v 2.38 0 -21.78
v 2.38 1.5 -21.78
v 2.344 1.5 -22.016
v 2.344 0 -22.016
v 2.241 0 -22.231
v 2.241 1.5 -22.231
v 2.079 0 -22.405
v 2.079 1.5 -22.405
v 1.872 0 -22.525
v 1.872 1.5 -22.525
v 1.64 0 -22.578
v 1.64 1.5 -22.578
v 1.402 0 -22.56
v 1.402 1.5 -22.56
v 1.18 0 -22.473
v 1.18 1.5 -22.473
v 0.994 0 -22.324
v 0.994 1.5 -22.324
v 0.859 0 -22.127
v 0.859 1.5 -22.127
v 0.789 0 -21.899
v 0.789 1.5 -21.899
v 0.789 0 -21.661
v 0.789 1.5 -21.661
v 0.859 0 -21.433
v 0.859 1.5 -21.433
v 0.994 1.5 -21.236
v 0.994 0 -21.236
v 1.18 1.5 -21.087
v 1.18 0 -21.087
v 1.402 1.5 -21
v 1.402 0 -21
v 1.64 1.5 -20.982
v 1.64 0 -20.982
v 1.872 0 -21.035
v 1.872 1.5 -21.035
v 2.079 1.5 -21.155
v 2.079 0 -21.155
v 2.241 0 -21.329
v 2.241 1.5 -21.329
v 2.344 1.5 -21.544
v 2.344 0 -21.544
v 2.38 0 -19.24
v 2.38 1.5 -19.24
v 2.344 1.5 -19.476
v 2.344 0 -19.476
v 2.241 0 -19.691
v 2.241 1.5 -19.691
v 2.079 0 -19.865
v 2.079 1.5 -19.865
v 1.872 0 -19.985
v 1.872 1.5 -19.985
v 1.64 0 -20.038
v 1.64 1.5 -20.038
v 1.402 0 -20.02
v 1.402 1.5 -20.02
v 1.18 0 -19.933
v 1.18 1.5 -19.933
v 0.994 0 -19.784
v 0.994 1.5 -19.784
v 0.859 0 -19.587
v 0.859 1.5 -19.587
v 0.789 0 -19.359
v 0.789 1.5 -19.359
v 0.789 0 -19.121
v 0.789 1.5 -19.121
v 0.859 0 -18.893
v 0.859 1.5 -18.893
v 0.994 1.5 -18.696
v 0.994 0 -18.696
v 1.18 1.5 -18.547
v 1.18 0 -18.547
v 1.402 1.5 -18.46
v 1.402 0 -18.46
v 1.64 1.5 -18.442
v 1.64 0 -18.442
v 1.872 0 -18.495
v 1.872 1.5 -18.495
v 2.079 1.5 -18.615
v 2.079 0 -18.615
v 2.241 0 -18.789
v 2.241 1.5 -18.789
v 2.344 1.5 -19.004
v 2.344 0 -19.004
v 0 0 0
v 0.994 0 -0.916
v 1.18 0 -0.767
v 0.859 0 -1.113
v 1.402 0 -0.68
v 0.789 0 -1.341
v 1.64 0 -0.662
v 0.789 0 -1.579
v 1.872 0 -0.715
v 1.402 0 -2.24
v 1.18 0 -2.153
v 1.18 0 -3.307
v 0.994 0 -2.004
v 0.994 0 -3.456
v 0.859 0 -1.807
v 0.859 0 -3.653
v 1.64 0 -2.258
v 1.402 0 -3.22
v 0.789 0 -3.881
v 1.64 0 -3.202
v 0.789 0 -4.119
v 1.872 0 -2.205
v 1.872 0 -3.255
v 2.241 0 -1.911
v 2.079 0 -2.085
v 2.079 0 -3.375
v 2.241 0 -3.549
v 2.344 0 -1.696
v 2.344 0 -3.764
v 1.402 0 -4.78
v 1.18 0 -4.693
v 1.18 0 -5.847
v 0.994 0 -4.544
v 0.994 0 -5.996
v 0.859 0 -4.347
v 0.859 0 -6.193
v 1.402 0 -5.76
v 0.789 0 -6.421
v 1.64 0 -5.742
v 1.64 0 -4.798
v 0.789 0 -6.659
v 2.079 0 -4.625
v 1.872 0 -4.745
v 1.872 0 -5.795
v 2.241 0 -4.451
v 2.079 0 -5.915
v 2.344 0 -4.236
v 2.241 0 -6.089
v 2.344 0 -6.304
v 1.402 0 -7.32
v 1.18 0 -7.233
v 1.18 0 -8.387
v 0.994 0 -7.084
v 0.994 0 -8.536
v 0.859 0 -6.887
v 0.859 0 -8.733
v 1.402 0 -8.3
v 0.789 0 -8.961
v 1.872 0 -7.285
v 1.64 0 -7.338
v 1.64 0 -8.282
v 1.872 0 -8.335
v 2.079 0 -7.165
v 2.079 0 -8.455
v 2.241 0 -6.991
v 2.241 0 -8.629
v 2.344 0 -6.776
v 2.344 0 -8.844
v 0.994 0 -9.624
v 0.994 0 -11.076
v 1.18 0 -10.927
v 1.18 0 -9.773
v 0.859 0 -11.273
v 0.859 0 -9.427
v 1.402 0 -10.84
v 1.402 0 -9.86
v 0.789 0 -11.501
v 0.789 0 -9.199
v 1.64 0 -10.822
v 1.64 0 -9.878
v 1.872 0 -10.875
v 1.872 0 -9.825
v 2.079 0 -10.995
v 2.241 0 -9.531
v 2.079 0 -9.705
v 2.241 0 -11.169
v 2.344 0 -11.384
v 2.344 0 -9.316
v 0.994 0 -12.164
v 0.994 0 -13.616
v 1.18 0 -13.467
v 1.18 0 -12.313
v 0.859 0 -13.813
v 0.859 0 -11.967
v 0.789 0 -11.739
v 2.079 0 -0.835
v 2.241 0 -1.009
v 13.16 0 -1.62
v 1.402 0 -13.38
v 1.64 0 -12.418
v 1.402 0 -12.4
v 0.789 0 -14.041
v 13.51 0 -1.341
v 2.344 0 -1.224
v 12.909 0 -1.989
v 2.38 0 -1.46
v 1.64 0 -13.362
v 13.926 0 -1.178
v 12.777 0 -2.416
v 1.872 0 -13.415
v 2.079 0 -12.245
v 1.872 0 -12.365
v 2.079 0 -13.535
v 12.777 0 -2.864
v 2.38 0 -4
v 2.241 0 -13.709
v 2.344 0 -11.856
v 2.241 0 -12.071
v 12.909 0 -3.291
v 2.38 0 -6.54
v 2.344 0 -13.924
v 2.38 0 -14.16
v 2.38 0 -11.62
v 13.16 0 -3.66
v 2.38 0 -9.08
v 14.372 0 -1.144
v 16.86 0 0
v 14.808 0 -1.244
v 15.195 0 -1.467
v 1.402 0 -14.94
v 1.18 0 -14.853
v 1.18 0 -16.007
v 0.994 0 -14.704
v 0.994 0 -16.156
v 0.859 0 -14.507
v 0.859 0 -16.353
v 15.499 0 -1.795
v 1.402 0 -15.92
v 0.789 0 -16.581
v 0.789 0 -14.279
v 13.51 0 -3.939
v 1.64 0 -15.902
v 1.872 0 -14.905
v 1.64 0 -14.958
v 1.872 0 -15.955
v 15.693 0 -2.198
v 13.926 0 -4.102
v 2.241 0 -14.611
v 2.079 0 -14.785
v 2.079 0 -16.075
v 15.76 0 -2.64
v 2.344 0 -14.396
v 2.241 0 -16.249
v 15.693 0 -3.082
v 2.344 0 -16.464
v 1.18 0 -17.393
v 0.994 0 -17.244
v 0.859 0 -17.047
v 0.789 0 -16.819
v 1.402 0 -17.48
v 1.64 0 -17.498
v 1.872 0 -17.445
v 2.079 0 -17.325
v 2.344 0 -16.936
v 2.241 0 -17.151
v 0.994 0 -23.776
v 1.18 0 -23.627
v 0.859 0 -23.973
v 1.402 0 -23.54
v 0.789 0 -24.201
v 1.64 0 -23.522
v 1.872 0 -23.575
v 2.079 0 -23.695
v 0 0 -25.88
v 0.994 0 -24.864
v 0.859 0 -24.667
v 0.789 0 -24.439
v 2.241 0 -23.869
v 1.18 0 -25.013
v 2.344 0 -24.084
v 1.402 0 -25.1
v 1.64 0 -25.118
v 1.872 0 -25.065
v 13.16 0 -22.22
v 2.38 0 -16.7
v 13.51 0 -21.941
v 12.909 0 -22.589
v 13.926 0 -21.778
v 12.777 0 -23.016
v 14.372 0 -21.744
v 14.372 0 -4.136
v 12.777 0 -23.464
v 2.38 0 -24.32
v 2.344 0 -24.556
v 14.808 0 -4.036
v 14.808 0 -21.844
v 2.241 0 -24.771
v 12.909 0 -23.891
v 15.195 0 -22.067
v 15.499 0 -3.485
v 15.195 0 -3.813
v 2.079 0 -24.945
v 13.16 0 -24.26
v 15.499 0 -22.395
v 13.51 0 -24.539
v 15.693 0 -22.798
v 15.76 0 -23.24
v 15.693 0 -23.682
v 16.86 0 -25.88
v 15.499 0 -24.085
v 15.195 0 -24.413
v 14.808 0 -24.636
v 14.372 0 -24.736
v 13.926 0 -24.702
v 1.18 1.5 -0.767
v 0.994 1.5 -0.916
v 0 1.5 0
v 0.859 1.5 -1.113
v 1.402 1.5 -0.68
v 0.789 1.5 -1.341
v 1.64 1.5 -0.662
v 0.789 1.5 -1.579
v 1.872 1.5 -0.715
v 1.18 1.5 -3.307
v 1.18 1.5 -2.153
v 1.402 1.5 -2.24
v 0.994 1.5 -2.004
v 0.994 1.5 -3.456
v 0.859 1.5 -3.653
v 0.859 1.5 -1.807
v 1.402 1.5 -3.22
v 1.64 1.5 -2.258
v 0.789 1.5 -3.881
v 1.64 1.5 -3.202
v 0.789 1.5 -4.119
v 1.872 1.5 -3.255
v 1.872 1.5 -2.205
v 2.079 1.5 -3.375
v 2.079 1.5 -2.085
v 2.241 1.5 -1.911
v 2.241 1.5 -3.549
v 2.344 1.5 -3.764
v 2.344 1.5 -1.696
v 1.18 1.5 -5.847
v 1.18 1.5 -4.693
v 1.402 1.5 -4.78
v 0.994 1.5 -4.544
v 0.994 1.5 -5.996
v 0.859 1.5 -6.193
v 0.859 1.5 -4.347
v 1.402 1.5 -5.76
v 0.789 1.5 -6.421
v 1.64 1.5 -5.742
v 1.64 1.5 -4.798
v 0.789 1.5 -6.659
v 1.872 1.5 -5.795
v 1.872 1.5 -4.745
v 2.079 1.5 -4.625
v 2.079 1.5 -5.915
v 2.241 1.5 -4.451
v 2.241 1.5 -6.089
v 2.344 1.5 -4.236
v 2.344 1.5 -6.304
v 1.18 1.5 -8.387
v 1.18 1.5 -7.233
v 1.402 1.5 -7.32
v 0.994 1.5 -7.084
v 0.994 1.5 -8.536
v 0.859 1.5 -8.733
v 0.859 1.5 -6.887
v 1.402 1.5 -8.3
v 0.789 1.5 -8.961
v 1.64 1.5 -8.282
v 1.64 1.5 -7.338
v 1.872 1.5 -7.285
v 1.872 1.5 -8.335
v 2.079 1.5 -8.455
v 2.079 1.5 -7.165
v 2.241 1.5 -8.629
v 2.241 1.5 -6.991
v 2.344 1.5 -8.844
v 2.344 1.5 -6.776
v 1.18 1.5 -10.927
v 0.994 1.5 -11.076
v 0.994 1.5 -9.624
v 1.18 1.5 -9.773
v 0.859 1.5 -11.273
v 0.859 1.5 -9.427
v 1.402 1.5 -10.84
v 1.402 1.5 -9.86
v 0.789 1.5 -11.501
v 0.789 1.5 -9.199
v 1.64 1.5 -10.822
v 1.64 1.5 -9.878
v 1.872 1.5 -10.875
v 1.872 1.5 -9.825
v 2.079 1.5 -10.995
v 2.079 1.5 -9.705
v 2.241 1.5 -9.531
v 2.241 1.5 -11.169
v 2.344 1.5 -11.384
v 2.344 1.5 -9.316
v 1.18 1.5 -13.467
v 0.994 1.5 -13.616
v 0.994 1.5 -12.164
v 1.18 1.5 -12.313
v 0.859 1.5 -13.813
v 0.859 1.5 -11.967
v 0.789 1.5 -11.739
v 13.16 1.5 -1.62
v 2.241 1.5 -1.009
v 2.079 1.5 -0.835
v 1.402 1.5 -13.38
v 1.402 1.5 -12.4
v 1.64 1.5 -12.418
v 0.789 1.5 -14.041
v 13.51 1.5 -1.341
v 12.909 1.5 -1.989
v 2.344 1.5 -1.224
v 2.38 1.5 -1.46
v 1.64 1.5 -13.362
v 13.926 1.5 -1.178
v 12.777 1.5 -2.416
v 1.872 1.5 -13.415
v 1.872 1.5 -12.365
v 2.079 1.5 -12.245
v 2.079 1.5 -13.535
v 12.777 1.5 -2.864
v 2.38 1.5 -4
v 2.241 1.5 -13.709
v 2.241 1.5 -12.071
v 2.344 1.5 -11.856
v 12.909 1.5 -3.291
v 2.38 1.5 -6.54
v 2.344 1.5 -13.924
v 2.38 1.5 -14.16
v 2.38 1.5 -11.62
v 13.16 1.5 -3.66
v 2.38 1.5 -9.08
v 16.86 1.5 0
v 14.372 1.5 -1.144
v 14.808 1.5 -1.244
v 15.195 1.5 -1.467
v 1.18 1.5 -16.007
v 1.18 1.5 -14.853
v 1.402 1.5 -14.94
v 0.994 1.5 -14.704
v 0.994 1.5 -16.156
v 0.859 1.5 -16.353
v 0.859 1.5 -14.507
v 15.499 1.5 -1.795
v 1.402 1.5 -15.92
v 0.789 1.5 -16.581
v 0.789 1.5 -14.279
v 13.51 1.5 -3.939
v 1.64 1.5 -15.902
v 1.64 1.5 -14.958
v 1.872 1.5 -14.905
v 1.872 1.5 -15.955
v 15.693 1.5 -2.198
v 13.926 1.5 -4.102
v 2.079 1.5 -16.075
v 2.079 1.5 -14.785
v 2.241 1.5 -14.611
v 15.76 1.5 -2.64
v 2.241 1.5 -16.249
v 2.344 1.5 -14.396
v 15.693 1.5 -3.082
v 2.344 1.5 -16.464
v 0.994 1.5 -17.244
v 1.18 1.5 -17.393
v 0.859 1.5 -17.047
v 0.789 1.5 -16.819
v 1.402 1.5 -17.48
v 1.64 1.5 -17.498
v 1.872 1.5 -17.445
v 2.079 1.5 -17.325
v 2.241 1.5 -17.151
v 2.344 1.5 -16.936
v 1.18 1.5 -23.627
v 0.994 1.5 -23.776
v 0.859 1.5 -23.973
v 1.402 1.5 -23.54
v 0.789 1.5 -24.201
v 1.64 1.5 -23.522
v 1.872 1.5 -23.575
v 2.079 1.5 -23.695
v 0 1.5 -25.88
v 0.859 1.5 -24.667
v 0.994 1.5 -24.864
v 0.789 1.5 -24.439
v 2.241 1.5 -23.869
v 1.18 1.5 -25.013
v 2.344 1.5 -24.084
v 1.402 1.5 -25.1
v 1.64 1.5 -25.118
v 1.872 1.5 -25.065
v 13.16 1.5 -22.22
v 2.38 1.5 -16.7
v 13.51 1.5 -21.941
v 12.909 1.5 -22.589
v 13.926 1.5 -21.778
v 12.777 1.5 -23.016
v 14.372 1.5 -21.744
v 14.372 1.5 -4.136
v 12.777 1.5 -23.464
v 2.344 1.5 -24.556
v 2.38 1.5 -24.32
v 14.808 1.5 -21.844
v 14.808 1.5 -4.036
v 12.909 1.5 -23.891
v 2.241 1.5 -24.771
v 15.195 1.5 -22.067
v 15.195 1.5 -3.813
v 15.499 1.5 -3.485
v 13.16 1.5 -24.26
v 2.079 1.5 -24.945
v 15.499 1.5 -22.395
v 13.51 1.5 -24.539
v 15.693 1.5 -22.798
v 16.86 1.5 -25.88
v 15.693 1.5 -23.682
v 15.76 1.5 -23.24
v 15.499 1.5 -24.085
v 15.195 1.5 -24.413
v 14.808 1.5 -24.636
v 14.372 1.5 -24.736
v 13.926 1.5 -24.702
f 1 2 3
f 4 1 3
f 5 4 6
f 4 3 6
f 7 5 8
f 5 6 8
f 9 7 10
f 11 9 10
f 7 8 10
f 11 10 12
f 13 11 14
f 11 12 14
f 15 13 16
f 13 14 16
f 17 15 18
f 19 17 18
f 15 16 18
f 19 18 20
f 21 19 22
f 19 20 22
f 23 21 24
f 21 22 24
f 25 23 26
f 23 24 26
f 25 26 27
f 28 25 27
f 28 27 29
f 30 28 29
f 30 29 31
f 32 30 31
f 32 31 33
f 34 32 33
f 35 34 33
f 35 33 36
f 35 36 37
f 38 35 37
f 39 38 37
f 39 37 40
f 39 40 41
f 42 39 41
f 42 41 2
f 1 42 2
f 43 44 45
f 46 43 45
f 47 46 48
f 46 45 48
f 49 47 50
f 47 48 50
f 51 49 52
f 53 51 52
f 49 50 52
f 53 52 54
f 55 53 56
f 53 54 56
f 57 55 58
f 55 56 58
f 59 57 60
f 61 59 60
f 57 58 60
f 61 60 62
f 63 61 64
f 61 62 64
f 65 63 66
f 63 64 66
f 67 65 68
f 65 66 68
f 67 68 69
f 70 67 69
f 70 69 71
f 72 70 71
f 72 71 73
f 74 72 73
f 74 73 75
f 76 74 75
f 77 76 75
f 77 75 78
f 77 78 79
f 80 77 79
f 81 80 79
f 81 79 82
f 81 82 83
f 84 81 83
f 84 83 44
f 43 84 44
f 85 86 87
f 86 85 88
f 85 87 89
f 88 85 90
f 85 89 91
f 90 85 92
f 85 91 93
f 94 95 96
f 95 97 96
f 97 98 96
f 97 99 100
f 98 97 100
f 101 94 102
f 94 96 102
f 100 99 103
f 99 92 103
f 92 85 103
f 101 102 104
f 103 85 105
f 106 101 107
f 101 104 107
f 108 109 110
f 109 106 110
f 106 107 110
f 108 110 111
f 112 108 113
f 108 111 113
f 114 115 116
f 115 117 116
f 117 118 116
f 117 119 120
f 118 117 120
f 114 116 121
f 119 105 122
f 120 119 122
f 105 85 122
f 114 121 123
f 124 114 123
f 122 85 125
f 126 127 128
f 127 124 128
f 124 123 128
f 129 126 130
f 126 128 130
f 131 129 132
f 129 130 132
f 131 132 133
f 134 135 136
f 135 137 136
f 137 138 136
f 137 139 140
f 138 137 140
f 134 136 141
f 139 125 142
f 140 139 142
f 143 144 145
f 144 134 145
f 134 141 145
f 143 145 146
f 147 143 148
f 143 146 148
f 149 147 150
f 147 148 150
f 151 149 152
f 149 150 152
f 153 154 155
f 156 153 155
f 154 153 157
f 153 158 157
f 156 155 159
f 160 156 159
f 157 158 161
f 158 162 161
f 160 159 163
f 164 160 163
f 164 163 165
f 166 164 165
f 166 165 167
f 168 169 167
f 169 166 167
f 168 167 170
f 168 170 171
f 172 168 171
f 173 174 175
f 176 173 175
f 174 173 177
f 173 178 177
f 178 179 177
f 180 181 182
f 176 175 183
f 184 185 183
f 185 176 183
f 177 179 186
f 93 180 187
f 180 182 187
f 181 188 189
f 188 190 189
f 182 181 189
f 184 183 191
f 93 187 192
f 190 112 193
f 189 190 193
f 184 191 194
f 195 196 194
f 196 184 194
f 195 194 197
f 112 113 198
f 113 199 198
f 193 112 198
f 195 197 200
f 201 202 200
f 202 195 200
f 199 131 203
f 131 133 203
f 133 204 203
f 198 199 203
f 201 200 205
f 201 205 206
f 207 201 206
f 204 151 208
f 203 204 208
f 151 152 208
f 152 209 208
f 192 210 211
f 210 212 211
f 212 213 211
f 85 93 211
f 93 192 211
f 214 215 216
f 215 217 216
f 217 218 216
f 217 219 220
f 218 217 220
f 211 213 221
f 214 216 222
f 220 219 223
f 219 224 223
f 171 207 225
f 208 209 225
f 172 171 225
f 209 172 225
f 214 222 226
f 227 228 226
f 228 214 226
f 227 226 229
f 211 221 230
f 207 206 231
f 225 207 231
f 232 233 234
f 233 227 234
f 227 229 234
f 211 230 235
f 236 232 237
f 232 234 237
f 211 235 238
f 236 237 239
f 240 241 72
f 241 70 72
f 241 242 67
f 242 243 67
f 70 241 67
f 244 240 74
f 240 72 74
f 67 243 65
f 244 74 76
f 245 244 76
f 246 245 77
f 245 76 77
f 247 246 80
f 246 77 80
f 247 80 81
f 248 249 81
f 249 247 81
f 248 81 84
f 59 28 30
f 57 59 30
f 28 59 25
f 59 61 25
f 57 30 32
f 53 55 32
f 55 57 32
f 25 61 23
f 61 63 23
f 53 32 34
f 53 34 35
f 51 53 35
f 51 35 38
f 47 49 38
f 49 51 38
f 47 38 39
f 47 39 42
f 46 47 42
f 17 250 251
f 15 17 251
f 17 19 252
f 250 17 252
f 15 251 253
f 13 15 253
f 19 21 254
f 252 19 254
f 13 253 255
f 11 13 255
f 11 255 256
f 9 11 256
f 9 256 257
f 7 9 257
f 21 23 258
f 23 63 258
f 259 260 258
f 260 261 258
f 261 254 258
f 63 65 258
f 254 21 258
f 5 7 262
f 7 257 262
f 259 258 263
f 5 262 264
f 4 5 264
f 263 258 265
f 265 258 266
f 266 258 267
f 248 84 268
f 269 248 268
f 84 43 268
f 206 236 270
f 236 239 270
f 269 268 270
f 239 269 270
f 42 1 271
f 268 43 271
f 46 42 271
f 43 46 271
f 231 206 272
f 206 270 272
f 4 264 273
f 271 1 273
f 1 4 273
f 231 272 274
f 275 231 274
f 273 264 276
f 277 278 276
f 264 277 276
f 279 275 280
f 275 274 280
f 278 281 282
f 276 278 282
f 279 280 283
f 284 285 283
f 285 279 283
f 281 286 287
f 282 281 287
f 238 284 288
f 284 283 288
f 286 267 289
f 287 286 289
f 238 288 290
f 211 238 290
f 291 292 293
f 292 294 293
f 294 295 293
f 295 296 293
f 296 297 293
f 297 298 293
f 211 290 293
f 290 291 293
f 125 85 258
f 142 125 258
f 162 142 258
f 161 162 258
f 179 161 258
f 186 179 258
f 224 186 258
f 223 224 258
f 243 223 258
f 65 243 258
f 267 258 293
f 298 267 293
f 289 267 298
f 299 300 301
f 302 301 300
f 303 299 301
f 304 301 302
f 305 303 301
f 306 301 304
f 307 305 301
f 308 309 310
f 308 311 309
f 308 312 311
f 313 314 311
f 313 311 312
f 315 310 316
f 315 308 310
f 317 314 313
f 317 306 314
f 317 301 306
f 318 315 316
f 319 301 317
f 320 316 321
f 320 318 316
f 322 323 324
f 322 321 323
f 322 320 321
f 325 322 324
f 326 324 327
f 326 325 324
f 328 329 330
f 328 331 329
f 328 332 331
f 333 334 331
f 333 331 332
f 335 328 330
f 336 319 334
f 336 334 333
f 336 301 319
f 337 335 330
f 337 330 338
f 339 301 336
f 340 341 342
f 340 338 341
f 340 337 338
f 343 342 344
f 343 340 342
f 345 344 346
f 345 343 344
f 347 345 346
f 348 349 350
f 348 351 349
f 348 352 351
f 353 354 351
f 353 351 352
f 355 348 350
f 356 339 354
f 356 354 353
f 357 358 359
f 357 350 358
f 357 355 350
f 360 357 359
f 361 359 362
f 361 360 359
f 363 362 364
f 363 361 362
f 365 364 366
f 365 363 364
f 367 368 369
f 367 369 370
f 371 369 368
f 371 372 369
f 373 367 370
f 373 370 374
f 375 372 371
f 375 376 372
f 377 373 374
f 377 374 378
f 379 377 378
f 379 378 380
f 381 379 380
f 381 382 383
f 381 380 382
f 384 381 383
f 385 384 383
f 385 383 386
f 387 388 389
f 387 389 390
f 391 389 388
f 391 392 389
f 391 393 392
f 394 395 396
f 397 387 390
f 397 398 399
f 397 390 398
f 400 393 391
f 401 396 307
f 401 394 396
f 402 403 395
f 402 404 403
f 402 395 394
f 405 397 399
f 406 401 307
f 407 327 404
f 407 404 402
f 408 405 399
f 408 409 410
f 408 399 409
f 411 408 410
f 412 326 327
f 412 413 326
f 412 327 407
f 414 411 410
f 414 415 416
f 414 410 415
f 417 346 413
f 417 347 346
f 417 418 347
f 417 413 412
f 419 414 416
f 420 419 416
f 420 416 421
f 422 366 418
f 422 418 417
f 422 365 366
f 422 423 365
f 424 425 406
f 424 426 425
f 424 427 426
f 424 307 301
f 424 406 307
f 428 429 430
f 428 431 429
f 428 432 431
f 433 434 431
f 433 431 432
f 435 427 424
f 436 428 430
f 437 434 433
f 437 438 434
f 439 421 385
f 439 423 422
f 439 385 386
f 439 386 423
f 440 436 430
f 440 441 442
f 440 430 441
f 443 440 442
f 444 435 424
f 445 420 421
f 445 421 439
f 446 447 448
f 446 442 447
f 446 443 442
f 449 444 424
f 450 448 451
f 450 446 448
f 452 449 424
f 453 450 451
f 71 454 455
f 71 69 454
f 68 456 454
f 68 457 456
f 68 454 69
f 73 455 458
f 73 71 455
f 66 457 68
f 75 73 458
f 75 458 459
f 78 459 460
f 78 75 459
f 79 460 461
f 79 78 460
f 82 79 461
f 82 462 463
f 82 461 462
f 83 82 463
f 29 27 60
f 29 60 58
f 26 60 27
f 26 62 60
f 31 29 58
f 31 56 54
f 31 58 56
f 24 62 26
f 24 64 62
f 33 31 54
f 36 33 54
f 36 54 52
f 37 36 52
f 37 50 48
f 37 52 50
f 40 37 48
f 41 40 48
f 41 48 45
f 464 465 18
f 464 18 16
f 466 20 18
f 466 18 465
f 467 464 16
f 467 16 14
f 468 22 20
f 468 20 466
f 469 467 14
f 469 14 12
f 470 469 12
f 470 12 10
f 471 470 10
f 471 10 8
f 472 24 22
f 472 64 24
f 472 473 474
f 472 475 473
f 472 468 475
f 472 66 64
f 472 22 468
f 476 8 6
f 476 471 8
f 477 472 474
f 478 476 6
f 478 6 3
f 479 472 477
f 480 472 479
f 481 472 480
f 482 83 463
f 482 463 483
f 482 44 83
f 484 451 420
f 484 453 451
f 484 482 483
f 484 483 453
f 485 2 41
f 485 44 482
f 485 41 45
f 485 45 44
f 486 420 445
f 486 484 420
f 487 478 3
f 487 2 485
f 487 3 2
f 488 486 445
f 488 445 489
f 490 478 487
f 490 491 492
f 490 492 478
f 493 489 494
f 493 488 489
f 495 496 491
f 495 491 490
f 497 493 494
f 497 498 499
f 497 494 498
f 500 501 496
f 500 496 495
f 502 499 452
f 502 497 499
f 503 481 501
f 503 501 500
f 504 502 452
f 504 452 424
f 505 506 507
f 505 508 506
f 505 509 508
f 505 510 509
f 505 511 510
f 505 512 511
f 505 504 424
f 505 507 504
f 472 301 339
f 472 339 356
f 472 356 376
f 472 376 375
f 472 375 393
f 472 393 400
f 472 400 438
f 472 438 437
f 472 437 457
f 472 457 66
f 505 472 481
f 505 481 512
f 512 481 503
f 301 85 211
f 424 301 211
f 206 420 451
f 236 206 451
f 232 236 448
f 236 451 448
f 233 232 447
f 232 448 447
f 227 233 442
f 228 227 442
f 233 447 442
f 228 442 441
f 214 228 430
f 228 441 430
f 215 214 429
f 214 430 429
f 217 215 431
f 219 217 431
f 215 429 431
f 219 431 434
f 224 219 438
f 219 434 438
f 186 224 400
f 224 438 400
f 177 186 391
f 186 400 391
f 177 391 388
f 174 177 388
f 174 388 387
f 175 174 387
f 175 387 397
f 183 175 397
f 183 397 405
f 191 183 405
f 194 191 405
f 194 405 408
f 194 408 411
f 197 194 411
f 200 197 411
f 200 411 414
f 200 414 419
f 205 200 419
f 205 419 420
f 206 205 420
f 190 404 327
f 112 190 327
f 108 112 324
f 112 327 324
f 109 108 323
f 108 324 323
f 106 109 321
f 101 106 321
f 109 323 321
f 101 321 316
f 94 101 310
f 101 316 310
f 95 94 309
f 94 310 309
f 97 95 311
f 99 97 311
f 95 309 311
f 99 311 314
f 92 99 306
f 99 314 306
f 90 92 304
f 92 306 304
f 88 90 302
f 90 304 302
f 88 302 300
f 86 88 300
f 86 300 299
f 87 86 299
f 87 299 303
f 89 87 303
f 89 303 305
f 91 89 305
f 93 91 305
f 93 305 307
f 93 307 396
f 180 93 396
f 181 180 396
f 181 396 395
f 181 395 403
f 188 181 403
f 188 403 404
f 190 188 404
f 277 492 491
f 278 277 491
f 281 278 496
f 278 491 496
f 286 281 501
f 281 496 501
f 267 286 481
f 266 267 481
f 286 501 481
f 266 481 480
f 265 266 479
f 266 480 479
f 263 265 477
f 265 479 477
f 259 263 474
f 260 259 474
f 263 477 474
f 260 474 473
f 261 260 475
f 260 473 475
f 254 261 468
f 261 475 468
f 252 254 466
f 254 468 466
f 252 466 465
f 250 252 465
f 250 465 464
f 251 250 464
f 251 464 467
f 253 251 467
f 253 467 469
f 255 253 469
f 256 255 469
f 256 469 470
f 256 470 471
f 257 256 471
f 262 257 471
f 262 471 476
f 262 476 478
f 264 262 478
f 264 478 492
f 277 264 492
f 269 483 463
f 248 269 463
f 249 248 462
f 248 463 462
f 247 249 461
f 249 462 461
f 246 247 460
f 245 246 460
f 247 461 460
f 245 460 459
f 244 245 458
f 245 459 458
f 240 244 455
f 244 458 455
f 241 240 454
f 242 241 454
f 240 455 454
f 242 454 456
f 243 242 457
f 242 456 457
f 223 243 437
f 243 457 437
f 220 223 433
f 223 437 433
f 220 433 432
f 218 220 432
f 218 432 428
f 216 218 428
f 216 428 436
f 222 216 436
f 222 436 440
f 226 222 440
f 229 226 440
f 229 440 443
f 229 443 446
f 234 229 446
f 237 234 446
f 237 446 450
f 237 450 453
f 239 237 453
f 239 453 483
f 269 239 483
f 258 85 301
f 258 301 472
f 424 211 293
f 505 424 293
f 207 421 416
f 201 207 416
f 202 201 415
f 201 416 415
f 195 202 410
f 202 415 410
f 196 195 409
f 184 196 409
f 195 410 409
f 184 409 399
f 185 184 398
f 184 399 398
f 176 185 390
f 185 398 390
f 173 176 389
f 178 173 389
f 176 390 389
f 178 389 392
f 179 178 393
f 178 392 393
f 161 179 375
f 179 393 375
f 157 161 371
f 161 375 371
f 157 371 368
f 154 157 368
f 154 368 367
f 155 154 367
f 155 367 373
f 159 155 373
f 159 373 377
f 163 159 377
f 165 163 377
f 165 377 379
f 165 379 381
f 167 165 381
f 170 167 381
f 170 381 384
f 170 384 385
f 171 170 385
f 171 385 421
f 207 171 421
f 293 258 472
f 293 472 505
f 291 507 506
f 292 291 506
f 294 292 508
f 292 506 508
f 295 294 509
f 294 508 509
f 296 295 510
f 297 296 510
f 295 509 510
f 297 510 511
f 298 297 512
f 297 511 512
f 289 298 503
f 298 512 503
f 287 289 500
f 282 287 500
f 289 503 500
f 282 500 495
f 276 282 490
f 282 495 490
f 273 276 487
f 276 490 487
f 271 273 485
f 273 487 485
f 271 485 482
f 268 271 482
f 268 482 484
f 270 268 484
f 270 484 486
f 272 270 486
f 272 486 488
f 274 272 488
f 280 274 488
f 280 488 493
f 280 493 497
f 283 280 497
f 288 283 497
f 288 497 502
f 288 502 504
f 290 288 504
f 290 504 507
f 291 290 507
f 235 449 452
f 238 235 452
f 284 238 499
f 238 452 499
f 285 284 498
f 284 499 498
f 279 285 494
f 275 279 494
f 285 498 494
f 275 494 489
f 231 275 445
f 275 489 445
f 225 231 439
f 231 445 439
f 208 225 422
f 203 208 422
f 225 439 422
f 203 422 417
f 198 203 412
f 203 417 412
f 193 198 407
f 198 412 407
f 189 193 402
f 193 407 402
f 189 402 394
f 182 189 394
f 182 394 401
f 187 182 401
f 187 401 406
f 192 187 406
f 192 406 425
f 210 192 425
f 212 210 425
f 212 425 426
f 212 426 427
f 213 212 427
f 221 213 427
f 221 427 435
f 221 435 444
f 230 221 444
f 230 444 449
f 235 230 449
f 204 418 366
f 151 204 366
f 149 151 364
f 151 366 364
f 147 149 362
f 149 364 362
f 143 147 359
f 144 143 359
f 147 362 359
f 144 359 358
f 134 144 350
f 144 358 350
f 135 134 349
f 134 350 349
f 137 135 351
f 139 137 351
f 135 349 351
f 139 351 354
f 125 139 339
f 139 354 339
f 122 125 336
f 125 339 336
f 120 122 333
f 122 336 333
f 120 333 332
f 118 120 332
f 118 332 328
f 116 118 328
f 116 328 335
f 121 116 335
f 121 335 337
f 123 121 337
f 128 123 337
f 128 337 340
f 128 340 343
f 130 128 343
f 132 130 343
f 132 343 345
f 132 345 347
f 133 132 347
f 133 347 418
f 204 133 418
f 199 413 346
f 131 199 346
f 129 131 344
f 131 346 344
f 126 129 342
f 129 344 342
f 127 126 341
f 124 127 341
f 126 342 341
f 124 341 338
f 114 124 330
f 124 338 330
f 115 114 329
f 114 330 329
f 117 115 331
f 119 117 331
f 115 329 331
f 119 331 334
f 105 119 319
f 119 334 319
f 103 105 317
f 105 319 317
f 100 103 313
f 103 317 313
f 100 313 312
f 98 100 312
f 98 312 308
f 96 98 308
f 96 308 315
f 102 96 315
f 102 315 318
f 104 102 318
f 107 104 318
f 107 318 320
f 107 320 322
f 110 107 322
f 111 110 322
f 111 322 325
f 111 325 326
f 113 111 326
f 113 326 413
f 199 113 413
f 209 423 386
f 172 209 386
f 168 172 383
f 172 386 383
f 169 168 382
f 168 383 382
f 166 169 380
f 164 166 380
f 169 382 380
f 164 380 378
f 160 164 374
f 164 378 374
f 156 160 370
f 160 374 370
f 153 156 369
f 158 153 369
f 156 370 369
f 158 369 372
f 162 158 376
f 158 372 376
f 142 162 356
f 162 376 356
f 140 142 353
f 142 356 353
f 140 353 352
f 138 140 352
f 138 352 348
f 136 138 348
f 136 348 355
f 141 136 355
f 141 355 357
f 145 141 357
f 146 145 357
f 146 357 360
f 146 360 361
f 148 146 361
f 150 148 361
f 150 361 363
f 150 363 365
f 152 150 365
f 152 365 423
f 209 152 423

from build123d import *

# Parameters (mm, degrees)
SKETCH1_W           = 16.86
SKETCH1_H           = 25.88
BOSS_EXTRUDE1_DEPTH = 1.5
CUT_EXTRUDE1_REACH  = 3.5
SKETCH2_R           = 1.5
CUT_EXTRUDE2_REACH  = 3.5
SKETCH3_R           = 0.8


with BuildPart() as part:
    # Sketch1 → Boss-Extrude1 (new body)
    with BuildSketch(Plane(origin=(0, 0, 0), x_dir=(1, 0, 0), z_dir=(0, 1, 0))):
        with Locations((8.43, 12.94)):
            Rectangle(SKETCH1_W, SKETCH1_H)
    extrude(amount=BOSS_EXTRUDE1_DEPTH)

    # Sketch2 → Cut-Extrude1 (cut, up to next)
    with BuildSketch(Plane(origin=(0, 1.5, 0), x_dir=(1, 0, 0), z_dir=(0, 1, 0)), mode=Mode.PRIVATE) as cut_extrude1_sk1:
        with Locations((14.26, 23.24)):
            Circle(SKETCH2_R)
    cut_extrude1_tool1 = extrude(cut_extrude1_sk1.sketch, amount=-CUT_EXTRUDE1_REACH, mode=Mode.PRIVATE) & part.part
    add(cut_extrude1_tool1.solids().sort_by_distance((14.26, 1.5, -23.24))[0], mode=Mode.SUBTRACT)
    # Sketch2 → Cut-Extrude1 (cut, up to next)
    with BuildSketch(Plane(origin=(0, 1.5, 0), x_dir=(1, 0, 0), z_dir=(0, 1, 0)), mode=Mode.PRIVATE) as cut_extrude1_sk2:
        with Locations((14.26, 2.64)):
            Circle(SKETCH2_R)
    cut_extrude1_tool2 = extrude(cut_extrude1_sk2.sketch, amount=-CUT_EXTRUDE1_REACH, mode=Mode.PRIVATE) & part.part
    add(cut_extrude1_tool2.solids().sort_by_distance((14.26, 1.5, -2.64))[0], mode=Mode.SUBTRACT)

    # Sketch3 → Cut-Extrude2 (cut, up to next)
    with BuildSketch(Plane(origin=(0, 1.5, 0), x_dir=(1, 0, 0), z_dir=(0, 1, 0)), mode=Mode.PRIVATE) as cut_extrude2_sk1:
        with Locations((1.58, 24.32)):
            Circle(SKETCH3_R)
    cut_extrude2_tool1 = extrude(cut_extrude2_sk1.sketch, amount=-CUT_EXTRUDE2_REACH, mode=Mode.PRIVATE) & part.part
    add(cut_extrude2_tool1.solids().sort_by_distance((1.58, 1.5, -24.32))[0], mode=Mode.SUBTRACT)
    # Sketch3 → Cut-Extrude2 (cut, up to next)
    with BuildSketch(Plane(origin=(0, 1.5, 0), x_dir=(1, 0, 0), z_dir=(0, 1, 0)), mode=Mode.PRIVATE) as cut_extrude2_sk2:
        with Locations((1.58, 21.78)):
            Circle(SKETCH3_R)
    cut_extrude2_tool2 = extrude(cut_extrude2_sk2.sketch, amount=-CUT_EXTRUDE2_REACH, mode=Mode.PRIVATE) & part.part
    add(cut_extrude2_tool2.solids().sort_by_distance((1.58, 1.5, -21.78))[0], mode=Mode.SUBTRACT)
    # Sketch3 → Cut-Extrude2 (cut, up to next)
    with BuildSketch(Plane(origin=(0, 1.5, 0), x_dir=(1, 0, 0), z_dir=(0, 1, 0)), mode=Mode.PRIVATE) as cut_extrude2_sk3:
        with Locations((1.58, 19.24)):
            Circle(SKETCH3_R)
    cut_extrude2_tool3 = extrude(cut_extrude2_sk3.sketch, amount=-CUT_EXTRUDE2_REACH, mode=Mode.PRIVATE) & part.part
    add(cut_extrude2_tool3.solids().sort_by_distance((1.58, 1.5, -19.24))[0], mode=Mode.SUBTRACT)
    # Sketch3 → Cut-Extrude2 (cut, up to next)
    with BuildSketch(Plane(origin=(0, 1.5, 0), x_dir=(1, 0, 0), z_dir=(0, 1, 0)), mode=Mode.PRIVATE) as cut_extrude2_sk4:
        with Locations((1.58, 16.7)):
            Circle(SKETCH3_R)
    cut_extrude2_tool4 = extrude(cut_extrude2_sk4.sketch, amount=-CUT_EXTRUDE2_REACH, mode=Mode.PRIVATE) & part.part
    add(cut_extrude2_tool4.solids().sort_by_distance((1.58, 1.5, -16.7))[0], mode=Mode.SUBTRACT)
    # Sketch3 → Cut-Extrude2 (cut, up to next)
    with BuildSketch(Plane(origin=(0, 1.5, 0), x_dir=(1, 0, 0), z_dir=(0, 1, 0)), mode=Mode.PRIVATE) as cut_extrude2_sk5:
        with Locations((1.58, 14.16)):
            Circle(SKETCH3_R)
    cut_extrude2_tool5 = extrude(cut_extrude2_sk5.sketch, amount=-CUT_EXTRUDE2_REACH, mode=Mode.PRIVATE) & part.part
    add(cut_extrude2_tool5.solids().sort_by_distance((1.58, 1.5, -14.16))[0], mode=Mode.SUBTRACT)
    # Sketch3 → Cut-Extrude2 (cut, up to next)
    with BuildSketch(Plane(origin=(0, 1.5, 0), x_dir=(1, 0, 0), z_dir=(0, 1, 0)), mode=Mode.PRIVATE) as cut_extrude2_sk6:
        with Locations((1.58, 11.62)):
            Circle(SKETCH3_R)
    cut_extrude2_tool6 = extrude(cut_extrude2_sk6.sketch, amount=-CUT_EXTRUDE2_REACH, mode=Mode.PRIVATE) & part.part
    add(cut_extrude2_tool6.solids().sort_by_distance((1.58, 1.5, -11.62))[0], mode=Mode.SUBTRACT)
    # Sketch3 → Cut-Extrude2 (cut, up to next)
    with BuildSketch(Plane(origin=(0, 1.5, 0), x_dir=(1, 0, 0), z_dir=(0, 1, 0)), mode=Mode.PRIVATE) as cut_extrude2_sk7:
        with Locations((1.58, 9.08)):
            Circle(SKETCH3_R)
    cut_extrude2_tool7 = extrude(cut_extrude2_sk7.sketch, amount=-CUT_EXTRUDE2_REACH, mode=Mode.PRIVATE) & part.part
    add(cut_extrude2_tool7.solids().sort_by_distance((1.58, 1.5, -9.08))[0], mode=Mode.SUBTRACT)
    # Sketch3 → Cut-Extrude2 (cut, up to next)
    with BuildSketch(Plane(origin=(0, 1.5, 0), x_dir=(1, 0, 0), z_dir=(0, 1, 0)), mode=Mode.PRIVATE) as cut_extrude2_sk8:
        with Locations((1.58, 6.54)):
            Circle(SKETCH3_R)
    cut_extrude2_tool8 = extrude(cut_extrude2_sk8.sketch, amount=-CUT_EXTRUDE2_REACH, mode=Mode.PRIVATE) & part.part
    add(cut_extrude2_tool8.solids().sort_by_distance((1.58, 1.5, -6.54))[0], mode=Mode.SUBTRACT)
    # Sketch3 → Cut-Extrude2 (cut, up to next)
    with BuildSketch(Plane(origin=(0, 1.5, 0), x_dir=(1, 0, 0), z_dir=(0, 1, 0)), mode=Mode.PRIVATE) as cut_extrude2_sk9:
        with Locations((1.58, 4)):
            Circle(SKETCH3_R)
    cut_extrude2_tool9 = extrude(cut_extrude2_sk9.sketch, amount=-CUT_EXTRUDE2_REACH, mode=Mode.PRIVATE) & part.part
    add(cut_extrude2_tool9.solids().sort_by_distance((1.58, 1.5, -4))[0], mode=Mode.SUBTRACT)
    # Sketch3 → Cut-Extrude2 (cut, up to next)
    with BuildSketch(Plane(origin=(0, 1.5, 0), x_dir=(1, 0, 0), z_dir=(0, 1, 0)), mode=Mode.PRIVATE) as cut_extrude2_sk10:
        with Locations((1.58, 1.46)):
            Circle(SKETCH3_R)
    cut_extrude2_tool10 = extrude(cut_extrude2_sk10.sketch, amount=-CUT_EXTRUDE2_REACH, mode=Mode.PRIVATE) & part.part
    add(cut_extrude2_tool10.solids().sort_by_distance((1.58, 1.5, -1.46))[0], mode=Mode.SUBTRACT)


solid = part.part
